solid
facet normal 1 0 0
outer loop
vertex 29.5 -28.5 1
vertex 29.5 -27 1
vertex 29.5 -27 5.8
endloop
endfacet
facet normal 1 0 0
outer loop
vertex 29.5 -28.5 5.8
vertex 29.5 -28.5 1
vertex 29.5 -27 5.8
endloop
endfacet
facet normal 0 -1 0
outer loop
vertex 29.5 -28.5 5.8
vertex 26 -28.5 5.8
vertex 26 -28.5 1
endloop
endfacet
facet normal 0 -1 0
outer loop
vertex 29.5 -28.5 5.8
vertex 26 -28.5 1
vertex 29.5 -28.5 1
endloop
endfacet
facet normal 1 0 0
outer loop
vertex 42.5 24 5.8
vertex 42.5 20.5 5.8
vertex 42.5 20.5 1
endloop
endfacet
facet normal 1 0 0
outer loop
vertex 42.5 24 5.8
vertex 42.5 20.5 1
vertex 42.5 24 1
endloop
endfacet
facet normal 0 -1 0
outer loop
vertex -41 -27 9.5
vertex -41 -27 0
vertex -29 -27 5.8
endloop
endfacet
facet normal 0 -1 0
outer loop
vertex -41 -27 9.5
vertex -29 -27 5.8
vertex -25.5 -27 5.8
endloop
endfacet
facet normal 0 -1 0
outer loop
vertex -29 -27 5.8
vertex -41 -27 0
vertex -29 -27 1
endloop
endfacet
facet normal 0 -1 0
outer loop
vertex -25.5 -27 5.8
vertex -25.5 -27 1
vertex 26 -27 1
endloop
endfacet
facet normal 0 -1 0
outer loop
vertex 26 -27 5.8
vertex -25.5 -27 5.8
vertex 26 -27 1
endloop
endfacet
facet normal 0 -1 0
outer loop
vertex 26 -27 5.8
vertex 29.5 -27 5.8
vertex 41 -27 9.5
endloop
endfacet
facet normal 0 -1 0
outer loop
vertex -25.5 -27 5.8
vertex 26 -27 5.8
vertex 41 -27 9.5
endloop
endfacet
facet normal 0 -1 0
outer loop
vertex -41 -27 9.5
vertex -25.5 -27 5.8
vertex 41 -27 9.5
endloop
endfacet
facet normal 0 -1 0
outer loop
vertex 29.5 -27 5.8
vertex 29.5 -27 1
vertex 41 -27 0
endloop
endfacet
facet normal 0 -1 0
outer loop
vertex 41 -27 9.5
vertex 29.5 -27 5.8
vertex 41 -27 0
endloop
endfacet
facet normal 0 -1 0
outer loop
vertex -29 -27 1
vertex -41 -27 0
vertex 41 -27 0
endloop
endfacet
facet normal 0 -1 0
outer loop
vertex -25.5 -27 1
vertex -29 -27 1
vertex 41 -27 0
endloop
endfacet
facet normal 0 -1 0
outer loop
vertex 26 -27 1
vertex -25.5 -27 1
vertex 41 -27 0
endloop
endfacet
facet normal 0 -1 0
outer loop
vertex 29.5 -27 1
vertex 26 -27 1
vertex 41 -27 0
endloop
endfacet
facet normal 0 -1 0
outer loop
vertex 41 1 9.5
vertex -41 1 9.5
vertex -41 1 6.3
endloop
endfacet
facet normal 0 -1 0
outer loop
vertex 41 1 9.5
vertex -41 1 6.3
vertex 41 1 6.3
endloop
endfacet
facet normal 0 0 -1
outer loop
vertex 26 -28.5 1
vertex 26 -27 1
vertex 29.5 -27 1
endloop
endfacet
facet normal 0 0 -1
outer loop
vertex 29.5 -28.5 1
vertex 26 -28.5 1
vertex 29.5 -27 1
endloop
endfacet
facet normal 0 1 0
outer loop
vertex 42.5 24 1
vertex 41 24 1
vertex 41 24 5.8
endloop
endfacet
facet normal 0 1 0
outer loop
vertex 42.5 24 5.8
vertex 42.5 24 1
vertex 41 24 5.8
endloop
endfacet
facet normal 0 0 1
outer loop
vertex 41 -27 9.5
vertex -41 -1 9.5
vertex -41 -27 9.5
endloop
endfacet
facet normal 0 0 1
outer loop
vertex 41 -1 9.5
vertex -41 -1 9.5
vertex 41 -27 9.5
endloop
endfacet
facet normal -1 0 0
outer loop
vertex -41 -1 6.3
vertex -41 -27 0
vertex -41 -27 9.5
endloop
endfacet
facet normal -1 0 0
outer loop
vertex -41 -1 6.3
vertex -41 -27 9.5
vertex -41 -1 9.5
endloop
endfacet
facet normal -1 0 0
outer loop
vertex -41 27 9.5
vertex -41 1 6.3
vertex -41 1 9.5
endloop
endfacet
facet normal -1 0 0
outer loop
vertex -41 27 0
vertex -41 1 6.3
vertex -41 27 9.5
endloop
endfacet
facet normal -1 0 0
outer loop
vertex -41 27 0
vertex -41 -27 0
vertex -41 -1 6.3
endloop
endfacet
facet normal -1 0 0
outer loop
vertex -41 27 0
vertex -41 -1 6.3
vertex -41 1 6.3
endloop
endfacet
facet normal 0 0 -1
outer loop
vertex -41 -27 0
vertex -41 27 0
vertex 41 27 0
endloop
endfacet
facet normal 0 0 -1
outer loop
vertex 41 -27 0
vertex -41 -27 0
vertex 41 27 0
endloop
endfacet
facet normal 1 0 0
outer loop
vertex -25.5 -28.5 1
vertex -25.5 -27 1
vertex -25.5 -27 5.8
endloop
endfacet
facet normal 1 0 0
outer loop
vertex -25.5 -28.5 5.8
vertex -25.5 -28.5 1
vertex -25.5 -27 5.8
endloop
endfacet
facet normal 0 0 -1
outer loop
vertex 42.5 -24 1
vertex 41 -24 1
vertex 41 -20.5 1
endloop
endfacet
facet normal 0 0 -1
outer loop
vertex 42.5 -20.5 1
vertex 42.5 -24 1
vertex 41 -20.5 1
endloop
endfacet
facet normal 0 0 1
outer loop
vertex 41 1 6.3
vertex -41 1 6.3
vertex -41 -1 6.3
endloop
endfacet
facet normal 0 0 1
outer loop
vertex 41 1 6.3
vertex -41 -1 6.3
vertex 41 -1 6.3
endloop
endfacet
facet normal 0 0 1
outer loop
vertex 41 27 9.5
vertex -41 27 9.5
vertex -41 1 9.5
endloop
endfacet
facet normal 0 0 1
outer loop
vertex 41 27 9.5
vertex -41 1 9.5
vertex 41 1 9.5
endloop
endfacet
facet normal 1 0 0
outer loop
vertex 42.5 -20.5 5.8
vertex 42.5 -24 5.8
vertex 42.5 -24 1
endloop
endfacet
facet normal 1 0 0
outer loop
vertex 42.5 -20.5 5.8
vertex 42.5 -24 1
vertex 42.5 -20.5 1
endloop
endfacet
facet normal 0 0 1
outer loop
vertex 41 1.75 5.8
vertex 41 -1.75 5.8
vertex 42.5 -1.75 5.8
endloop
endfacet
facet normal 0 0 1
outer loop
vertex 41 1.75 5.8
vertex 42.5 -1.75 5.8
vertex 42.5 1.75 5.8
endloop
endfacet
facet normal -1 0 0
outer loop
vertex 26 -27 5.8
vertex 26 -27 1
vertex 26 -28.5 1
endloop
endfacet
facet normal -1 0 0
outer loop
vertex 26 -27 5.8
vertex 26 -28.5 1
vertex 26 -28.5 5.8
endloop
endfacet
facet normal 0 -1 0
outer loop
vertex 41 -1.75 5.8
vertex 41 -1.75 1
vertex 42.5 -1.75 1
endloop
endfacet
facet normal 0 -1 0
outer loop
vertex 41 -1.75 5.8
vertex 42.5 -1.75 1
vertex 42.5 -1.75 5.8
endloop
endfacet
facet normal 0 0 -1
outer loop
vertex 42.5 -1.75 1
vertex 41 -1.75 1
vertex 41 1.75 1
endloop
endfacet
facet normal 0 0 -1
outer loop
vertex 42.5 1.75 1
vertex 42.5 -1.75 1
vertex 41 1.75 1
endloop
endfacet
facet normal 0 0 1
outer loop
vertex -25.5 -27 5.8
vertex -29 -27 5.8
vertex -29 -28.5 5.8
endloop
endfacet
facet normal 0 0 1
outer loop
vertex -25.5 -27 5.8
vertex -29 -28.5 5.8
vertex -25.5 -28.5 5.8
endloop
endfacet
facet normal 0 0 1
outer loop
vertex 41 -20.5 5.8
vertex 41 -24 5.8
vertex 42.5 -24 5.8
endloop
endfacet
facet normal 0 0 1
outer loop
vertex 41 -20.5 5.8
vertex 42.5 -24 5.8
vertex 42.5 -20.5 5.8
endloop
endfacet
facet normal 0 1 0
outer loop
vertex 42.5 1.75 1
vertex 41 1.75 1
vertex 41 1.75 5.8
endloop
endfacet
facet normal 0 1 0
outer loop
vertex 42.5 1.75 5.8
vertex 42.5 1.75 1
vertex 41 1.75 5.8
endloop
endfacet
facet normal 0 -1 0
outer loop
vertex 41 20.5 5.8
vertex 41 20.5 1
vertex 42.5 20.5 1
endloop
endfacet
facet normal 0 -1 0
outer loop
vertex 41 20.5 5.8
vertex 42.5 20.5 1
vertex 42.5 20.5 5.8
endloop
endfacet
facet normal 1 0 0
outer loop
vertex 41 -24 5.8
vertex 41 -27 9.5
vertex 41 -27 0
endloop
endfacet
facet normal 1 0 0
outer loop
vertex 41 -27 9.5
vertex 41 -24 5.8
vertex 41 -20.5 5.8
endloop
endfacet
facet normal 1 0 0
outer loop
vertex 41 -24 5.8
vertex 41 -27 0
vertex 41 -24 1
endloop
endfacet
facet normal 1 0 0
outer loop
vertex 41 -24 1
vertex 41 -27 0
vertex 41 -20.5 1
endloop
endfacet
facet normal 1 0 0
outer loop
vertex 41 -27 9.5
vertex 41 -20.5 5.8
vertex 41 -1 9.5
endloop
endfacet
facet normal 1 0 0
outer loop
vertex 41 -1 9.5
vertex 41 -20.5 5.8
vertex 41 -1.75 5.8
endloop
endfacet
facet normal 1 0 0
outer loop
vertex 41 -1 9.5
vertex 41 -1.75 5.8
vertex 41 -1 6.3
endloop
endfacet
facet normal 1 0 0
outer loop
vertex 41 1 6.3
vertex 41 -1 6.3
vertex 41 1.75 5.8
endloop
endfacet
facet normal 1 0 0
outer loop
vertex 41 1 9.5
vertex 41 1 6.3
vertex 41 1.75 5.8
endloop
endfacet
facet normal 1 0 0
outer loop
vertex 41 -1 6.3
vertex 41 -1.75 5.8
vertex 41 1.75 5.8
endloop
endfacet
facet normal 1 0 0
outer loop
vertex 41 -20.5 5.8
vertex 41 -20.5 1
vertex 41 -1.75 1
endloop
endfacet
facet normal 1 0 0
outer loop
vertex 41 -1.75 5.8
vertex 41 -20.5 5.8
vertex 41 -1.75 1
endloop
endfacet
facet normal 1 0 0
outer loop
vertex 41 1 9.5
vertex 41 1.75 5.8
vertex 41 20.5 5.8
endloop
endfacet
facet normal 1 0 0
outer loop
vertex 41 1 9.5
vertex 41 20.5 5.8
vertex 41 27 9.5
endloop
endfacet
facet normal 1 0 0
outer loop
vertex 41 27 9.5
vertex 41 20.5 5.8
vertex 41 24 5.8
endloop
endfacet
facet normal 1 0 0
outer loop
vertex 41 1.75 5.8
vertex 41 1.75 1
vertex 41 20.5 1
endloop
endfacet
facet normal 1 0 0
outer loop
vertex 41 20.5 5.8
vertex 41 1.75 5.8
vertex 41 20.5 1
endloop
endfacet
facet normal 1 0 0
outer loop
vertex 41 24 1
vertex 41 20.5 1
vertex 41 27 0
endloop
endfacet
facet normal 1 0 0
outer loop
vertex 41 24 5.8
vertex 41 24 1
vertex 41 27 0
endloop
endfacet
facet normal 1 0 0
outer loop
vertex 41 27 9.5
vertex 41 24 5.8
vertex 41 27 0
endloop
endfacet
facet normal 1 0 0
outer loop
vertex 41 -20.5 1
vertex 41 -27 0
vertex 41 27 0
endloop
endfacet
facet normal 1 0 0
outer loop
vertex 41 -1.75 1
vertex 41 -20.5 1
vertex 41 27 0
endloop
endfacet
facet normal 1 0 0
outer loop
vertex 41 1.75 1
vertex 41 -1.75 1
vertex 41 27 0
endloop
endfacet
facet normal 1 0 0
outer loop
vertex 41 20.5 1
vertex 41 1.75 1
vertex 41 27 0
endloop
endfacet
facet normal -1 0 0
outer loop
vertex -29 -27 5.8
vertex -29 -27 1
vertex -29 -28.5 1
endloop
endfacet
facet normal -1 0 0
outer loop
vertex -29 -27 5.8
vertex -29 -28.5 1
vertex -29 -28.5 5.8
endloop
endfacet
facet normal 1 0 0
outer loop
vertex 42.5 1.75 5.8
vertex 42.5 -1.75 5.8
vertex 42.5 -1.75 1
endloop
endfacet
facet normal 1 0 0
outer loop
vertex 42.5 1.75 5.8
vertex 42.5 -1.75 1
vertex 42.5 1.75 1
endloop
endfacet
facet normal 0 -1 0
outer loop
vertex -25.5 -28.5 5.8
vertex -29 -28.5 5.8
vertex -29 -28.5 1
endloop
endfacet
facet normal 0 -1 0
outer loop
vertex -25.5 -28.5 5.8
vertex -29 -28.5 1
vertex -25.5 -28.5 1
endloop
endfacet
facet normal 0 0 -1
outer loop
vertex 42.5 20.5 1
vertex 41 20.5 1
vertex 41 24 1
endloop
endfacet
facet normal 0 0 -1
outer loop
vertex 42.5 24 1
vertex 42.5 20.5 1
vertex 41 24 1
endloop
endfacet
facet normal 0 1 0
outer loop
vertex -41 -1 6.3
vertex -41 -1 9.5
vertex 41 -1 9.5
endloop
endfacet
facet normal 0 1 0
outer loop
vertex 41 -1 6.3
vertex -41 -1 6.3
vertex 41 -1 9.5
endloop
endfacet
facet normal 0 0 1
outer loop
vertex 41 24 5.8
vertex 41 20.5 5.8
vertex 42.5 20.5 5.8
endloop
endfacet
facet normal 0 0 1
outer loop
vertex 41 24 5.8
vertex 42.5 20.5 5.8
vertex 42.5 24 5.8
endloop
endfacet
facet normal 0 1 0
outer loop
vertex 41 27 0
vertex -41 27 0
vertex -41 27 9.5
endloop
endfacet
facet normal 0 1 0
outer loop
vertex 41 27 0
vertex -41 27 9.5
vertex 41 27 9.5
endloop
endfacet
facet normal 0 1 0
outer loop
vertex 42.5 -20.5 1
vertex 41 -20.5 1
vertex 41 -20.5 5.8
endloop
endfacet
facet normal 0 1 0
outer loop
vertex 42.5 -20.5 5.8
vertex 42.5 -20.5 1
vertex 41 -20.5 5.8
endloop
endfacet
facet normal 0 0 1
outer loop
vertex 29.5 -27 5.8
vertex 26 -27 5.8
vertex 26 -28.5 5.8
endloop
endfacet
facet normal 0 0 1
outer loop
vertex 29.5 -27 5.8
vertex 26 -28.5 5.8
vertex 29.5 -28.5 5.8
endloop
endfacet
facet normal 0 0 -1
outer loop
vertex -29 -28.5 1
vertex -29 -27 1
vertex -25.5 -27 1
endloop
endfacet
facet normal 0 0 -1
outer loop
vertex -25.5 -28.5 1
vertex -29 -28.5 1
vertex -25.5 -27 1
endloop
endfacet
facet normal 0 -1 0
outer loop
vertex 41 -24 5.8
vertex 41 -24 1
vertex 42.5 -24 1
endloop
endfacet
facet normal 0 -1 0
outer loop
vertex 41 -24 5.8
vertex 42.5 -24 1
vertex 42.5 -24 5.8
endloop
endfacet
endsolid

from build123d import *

# Parameters (mm, degrees)
F0_W     = 82
F0_H     = 54
F1_DEPTH = 9.5
F2_W     = 82
F2_H     = 2
F3_DEPTH = 3.2
F4_W     = 3.5
F4_H     = 4.8
F6_DEPTH = 1.5
F5_W     = 3.5
F5_H     = 4.8
F7_DEPTH = 1.5


with BuildPart() as f1:
    # F0 (on Top) → F1 (new body)
    with BuildSketch(Plane.XY):
        Rectangle(F0_W, F0_H)
    extrude(amount=F1_DEPTH)

    # F2 (on face) → F3 (cut)
    with BuildSketch(Plane.XY.offset(9.5)):
        Rectangle(F2_W, F2_H)
    extrude(amount=-F3_DEPTH, mode=Mode.SUBTRACT)

    # F4 (on face) → F6 (join)
    with BuildSketch(Plane.XZ.offset(27)):
        with Locations((27.75, 3.4)):
            Rectangle(F4_W, F4_H)
        with Locations((-27.25, 3.4)):
            Rectangle(F4_W, F4_H)
    extrude(amount=F6_DEPTH)

    # F5 (on face) → F7 (join)
    with BuildSketch(Plane.YZ.offset(41)):
        with Locations((-22.25, 3.4)):
            Rectangle(F5_W, F5_H)
        with Locations((0, 3.4)):
            Rectangle(F5_W, F5_H)
        with Locations((22.25, 3.4)):
            Rectangle(F5_W, F5_H)
    extrude(amount=F7_DEPTH)


solid = f1.part
